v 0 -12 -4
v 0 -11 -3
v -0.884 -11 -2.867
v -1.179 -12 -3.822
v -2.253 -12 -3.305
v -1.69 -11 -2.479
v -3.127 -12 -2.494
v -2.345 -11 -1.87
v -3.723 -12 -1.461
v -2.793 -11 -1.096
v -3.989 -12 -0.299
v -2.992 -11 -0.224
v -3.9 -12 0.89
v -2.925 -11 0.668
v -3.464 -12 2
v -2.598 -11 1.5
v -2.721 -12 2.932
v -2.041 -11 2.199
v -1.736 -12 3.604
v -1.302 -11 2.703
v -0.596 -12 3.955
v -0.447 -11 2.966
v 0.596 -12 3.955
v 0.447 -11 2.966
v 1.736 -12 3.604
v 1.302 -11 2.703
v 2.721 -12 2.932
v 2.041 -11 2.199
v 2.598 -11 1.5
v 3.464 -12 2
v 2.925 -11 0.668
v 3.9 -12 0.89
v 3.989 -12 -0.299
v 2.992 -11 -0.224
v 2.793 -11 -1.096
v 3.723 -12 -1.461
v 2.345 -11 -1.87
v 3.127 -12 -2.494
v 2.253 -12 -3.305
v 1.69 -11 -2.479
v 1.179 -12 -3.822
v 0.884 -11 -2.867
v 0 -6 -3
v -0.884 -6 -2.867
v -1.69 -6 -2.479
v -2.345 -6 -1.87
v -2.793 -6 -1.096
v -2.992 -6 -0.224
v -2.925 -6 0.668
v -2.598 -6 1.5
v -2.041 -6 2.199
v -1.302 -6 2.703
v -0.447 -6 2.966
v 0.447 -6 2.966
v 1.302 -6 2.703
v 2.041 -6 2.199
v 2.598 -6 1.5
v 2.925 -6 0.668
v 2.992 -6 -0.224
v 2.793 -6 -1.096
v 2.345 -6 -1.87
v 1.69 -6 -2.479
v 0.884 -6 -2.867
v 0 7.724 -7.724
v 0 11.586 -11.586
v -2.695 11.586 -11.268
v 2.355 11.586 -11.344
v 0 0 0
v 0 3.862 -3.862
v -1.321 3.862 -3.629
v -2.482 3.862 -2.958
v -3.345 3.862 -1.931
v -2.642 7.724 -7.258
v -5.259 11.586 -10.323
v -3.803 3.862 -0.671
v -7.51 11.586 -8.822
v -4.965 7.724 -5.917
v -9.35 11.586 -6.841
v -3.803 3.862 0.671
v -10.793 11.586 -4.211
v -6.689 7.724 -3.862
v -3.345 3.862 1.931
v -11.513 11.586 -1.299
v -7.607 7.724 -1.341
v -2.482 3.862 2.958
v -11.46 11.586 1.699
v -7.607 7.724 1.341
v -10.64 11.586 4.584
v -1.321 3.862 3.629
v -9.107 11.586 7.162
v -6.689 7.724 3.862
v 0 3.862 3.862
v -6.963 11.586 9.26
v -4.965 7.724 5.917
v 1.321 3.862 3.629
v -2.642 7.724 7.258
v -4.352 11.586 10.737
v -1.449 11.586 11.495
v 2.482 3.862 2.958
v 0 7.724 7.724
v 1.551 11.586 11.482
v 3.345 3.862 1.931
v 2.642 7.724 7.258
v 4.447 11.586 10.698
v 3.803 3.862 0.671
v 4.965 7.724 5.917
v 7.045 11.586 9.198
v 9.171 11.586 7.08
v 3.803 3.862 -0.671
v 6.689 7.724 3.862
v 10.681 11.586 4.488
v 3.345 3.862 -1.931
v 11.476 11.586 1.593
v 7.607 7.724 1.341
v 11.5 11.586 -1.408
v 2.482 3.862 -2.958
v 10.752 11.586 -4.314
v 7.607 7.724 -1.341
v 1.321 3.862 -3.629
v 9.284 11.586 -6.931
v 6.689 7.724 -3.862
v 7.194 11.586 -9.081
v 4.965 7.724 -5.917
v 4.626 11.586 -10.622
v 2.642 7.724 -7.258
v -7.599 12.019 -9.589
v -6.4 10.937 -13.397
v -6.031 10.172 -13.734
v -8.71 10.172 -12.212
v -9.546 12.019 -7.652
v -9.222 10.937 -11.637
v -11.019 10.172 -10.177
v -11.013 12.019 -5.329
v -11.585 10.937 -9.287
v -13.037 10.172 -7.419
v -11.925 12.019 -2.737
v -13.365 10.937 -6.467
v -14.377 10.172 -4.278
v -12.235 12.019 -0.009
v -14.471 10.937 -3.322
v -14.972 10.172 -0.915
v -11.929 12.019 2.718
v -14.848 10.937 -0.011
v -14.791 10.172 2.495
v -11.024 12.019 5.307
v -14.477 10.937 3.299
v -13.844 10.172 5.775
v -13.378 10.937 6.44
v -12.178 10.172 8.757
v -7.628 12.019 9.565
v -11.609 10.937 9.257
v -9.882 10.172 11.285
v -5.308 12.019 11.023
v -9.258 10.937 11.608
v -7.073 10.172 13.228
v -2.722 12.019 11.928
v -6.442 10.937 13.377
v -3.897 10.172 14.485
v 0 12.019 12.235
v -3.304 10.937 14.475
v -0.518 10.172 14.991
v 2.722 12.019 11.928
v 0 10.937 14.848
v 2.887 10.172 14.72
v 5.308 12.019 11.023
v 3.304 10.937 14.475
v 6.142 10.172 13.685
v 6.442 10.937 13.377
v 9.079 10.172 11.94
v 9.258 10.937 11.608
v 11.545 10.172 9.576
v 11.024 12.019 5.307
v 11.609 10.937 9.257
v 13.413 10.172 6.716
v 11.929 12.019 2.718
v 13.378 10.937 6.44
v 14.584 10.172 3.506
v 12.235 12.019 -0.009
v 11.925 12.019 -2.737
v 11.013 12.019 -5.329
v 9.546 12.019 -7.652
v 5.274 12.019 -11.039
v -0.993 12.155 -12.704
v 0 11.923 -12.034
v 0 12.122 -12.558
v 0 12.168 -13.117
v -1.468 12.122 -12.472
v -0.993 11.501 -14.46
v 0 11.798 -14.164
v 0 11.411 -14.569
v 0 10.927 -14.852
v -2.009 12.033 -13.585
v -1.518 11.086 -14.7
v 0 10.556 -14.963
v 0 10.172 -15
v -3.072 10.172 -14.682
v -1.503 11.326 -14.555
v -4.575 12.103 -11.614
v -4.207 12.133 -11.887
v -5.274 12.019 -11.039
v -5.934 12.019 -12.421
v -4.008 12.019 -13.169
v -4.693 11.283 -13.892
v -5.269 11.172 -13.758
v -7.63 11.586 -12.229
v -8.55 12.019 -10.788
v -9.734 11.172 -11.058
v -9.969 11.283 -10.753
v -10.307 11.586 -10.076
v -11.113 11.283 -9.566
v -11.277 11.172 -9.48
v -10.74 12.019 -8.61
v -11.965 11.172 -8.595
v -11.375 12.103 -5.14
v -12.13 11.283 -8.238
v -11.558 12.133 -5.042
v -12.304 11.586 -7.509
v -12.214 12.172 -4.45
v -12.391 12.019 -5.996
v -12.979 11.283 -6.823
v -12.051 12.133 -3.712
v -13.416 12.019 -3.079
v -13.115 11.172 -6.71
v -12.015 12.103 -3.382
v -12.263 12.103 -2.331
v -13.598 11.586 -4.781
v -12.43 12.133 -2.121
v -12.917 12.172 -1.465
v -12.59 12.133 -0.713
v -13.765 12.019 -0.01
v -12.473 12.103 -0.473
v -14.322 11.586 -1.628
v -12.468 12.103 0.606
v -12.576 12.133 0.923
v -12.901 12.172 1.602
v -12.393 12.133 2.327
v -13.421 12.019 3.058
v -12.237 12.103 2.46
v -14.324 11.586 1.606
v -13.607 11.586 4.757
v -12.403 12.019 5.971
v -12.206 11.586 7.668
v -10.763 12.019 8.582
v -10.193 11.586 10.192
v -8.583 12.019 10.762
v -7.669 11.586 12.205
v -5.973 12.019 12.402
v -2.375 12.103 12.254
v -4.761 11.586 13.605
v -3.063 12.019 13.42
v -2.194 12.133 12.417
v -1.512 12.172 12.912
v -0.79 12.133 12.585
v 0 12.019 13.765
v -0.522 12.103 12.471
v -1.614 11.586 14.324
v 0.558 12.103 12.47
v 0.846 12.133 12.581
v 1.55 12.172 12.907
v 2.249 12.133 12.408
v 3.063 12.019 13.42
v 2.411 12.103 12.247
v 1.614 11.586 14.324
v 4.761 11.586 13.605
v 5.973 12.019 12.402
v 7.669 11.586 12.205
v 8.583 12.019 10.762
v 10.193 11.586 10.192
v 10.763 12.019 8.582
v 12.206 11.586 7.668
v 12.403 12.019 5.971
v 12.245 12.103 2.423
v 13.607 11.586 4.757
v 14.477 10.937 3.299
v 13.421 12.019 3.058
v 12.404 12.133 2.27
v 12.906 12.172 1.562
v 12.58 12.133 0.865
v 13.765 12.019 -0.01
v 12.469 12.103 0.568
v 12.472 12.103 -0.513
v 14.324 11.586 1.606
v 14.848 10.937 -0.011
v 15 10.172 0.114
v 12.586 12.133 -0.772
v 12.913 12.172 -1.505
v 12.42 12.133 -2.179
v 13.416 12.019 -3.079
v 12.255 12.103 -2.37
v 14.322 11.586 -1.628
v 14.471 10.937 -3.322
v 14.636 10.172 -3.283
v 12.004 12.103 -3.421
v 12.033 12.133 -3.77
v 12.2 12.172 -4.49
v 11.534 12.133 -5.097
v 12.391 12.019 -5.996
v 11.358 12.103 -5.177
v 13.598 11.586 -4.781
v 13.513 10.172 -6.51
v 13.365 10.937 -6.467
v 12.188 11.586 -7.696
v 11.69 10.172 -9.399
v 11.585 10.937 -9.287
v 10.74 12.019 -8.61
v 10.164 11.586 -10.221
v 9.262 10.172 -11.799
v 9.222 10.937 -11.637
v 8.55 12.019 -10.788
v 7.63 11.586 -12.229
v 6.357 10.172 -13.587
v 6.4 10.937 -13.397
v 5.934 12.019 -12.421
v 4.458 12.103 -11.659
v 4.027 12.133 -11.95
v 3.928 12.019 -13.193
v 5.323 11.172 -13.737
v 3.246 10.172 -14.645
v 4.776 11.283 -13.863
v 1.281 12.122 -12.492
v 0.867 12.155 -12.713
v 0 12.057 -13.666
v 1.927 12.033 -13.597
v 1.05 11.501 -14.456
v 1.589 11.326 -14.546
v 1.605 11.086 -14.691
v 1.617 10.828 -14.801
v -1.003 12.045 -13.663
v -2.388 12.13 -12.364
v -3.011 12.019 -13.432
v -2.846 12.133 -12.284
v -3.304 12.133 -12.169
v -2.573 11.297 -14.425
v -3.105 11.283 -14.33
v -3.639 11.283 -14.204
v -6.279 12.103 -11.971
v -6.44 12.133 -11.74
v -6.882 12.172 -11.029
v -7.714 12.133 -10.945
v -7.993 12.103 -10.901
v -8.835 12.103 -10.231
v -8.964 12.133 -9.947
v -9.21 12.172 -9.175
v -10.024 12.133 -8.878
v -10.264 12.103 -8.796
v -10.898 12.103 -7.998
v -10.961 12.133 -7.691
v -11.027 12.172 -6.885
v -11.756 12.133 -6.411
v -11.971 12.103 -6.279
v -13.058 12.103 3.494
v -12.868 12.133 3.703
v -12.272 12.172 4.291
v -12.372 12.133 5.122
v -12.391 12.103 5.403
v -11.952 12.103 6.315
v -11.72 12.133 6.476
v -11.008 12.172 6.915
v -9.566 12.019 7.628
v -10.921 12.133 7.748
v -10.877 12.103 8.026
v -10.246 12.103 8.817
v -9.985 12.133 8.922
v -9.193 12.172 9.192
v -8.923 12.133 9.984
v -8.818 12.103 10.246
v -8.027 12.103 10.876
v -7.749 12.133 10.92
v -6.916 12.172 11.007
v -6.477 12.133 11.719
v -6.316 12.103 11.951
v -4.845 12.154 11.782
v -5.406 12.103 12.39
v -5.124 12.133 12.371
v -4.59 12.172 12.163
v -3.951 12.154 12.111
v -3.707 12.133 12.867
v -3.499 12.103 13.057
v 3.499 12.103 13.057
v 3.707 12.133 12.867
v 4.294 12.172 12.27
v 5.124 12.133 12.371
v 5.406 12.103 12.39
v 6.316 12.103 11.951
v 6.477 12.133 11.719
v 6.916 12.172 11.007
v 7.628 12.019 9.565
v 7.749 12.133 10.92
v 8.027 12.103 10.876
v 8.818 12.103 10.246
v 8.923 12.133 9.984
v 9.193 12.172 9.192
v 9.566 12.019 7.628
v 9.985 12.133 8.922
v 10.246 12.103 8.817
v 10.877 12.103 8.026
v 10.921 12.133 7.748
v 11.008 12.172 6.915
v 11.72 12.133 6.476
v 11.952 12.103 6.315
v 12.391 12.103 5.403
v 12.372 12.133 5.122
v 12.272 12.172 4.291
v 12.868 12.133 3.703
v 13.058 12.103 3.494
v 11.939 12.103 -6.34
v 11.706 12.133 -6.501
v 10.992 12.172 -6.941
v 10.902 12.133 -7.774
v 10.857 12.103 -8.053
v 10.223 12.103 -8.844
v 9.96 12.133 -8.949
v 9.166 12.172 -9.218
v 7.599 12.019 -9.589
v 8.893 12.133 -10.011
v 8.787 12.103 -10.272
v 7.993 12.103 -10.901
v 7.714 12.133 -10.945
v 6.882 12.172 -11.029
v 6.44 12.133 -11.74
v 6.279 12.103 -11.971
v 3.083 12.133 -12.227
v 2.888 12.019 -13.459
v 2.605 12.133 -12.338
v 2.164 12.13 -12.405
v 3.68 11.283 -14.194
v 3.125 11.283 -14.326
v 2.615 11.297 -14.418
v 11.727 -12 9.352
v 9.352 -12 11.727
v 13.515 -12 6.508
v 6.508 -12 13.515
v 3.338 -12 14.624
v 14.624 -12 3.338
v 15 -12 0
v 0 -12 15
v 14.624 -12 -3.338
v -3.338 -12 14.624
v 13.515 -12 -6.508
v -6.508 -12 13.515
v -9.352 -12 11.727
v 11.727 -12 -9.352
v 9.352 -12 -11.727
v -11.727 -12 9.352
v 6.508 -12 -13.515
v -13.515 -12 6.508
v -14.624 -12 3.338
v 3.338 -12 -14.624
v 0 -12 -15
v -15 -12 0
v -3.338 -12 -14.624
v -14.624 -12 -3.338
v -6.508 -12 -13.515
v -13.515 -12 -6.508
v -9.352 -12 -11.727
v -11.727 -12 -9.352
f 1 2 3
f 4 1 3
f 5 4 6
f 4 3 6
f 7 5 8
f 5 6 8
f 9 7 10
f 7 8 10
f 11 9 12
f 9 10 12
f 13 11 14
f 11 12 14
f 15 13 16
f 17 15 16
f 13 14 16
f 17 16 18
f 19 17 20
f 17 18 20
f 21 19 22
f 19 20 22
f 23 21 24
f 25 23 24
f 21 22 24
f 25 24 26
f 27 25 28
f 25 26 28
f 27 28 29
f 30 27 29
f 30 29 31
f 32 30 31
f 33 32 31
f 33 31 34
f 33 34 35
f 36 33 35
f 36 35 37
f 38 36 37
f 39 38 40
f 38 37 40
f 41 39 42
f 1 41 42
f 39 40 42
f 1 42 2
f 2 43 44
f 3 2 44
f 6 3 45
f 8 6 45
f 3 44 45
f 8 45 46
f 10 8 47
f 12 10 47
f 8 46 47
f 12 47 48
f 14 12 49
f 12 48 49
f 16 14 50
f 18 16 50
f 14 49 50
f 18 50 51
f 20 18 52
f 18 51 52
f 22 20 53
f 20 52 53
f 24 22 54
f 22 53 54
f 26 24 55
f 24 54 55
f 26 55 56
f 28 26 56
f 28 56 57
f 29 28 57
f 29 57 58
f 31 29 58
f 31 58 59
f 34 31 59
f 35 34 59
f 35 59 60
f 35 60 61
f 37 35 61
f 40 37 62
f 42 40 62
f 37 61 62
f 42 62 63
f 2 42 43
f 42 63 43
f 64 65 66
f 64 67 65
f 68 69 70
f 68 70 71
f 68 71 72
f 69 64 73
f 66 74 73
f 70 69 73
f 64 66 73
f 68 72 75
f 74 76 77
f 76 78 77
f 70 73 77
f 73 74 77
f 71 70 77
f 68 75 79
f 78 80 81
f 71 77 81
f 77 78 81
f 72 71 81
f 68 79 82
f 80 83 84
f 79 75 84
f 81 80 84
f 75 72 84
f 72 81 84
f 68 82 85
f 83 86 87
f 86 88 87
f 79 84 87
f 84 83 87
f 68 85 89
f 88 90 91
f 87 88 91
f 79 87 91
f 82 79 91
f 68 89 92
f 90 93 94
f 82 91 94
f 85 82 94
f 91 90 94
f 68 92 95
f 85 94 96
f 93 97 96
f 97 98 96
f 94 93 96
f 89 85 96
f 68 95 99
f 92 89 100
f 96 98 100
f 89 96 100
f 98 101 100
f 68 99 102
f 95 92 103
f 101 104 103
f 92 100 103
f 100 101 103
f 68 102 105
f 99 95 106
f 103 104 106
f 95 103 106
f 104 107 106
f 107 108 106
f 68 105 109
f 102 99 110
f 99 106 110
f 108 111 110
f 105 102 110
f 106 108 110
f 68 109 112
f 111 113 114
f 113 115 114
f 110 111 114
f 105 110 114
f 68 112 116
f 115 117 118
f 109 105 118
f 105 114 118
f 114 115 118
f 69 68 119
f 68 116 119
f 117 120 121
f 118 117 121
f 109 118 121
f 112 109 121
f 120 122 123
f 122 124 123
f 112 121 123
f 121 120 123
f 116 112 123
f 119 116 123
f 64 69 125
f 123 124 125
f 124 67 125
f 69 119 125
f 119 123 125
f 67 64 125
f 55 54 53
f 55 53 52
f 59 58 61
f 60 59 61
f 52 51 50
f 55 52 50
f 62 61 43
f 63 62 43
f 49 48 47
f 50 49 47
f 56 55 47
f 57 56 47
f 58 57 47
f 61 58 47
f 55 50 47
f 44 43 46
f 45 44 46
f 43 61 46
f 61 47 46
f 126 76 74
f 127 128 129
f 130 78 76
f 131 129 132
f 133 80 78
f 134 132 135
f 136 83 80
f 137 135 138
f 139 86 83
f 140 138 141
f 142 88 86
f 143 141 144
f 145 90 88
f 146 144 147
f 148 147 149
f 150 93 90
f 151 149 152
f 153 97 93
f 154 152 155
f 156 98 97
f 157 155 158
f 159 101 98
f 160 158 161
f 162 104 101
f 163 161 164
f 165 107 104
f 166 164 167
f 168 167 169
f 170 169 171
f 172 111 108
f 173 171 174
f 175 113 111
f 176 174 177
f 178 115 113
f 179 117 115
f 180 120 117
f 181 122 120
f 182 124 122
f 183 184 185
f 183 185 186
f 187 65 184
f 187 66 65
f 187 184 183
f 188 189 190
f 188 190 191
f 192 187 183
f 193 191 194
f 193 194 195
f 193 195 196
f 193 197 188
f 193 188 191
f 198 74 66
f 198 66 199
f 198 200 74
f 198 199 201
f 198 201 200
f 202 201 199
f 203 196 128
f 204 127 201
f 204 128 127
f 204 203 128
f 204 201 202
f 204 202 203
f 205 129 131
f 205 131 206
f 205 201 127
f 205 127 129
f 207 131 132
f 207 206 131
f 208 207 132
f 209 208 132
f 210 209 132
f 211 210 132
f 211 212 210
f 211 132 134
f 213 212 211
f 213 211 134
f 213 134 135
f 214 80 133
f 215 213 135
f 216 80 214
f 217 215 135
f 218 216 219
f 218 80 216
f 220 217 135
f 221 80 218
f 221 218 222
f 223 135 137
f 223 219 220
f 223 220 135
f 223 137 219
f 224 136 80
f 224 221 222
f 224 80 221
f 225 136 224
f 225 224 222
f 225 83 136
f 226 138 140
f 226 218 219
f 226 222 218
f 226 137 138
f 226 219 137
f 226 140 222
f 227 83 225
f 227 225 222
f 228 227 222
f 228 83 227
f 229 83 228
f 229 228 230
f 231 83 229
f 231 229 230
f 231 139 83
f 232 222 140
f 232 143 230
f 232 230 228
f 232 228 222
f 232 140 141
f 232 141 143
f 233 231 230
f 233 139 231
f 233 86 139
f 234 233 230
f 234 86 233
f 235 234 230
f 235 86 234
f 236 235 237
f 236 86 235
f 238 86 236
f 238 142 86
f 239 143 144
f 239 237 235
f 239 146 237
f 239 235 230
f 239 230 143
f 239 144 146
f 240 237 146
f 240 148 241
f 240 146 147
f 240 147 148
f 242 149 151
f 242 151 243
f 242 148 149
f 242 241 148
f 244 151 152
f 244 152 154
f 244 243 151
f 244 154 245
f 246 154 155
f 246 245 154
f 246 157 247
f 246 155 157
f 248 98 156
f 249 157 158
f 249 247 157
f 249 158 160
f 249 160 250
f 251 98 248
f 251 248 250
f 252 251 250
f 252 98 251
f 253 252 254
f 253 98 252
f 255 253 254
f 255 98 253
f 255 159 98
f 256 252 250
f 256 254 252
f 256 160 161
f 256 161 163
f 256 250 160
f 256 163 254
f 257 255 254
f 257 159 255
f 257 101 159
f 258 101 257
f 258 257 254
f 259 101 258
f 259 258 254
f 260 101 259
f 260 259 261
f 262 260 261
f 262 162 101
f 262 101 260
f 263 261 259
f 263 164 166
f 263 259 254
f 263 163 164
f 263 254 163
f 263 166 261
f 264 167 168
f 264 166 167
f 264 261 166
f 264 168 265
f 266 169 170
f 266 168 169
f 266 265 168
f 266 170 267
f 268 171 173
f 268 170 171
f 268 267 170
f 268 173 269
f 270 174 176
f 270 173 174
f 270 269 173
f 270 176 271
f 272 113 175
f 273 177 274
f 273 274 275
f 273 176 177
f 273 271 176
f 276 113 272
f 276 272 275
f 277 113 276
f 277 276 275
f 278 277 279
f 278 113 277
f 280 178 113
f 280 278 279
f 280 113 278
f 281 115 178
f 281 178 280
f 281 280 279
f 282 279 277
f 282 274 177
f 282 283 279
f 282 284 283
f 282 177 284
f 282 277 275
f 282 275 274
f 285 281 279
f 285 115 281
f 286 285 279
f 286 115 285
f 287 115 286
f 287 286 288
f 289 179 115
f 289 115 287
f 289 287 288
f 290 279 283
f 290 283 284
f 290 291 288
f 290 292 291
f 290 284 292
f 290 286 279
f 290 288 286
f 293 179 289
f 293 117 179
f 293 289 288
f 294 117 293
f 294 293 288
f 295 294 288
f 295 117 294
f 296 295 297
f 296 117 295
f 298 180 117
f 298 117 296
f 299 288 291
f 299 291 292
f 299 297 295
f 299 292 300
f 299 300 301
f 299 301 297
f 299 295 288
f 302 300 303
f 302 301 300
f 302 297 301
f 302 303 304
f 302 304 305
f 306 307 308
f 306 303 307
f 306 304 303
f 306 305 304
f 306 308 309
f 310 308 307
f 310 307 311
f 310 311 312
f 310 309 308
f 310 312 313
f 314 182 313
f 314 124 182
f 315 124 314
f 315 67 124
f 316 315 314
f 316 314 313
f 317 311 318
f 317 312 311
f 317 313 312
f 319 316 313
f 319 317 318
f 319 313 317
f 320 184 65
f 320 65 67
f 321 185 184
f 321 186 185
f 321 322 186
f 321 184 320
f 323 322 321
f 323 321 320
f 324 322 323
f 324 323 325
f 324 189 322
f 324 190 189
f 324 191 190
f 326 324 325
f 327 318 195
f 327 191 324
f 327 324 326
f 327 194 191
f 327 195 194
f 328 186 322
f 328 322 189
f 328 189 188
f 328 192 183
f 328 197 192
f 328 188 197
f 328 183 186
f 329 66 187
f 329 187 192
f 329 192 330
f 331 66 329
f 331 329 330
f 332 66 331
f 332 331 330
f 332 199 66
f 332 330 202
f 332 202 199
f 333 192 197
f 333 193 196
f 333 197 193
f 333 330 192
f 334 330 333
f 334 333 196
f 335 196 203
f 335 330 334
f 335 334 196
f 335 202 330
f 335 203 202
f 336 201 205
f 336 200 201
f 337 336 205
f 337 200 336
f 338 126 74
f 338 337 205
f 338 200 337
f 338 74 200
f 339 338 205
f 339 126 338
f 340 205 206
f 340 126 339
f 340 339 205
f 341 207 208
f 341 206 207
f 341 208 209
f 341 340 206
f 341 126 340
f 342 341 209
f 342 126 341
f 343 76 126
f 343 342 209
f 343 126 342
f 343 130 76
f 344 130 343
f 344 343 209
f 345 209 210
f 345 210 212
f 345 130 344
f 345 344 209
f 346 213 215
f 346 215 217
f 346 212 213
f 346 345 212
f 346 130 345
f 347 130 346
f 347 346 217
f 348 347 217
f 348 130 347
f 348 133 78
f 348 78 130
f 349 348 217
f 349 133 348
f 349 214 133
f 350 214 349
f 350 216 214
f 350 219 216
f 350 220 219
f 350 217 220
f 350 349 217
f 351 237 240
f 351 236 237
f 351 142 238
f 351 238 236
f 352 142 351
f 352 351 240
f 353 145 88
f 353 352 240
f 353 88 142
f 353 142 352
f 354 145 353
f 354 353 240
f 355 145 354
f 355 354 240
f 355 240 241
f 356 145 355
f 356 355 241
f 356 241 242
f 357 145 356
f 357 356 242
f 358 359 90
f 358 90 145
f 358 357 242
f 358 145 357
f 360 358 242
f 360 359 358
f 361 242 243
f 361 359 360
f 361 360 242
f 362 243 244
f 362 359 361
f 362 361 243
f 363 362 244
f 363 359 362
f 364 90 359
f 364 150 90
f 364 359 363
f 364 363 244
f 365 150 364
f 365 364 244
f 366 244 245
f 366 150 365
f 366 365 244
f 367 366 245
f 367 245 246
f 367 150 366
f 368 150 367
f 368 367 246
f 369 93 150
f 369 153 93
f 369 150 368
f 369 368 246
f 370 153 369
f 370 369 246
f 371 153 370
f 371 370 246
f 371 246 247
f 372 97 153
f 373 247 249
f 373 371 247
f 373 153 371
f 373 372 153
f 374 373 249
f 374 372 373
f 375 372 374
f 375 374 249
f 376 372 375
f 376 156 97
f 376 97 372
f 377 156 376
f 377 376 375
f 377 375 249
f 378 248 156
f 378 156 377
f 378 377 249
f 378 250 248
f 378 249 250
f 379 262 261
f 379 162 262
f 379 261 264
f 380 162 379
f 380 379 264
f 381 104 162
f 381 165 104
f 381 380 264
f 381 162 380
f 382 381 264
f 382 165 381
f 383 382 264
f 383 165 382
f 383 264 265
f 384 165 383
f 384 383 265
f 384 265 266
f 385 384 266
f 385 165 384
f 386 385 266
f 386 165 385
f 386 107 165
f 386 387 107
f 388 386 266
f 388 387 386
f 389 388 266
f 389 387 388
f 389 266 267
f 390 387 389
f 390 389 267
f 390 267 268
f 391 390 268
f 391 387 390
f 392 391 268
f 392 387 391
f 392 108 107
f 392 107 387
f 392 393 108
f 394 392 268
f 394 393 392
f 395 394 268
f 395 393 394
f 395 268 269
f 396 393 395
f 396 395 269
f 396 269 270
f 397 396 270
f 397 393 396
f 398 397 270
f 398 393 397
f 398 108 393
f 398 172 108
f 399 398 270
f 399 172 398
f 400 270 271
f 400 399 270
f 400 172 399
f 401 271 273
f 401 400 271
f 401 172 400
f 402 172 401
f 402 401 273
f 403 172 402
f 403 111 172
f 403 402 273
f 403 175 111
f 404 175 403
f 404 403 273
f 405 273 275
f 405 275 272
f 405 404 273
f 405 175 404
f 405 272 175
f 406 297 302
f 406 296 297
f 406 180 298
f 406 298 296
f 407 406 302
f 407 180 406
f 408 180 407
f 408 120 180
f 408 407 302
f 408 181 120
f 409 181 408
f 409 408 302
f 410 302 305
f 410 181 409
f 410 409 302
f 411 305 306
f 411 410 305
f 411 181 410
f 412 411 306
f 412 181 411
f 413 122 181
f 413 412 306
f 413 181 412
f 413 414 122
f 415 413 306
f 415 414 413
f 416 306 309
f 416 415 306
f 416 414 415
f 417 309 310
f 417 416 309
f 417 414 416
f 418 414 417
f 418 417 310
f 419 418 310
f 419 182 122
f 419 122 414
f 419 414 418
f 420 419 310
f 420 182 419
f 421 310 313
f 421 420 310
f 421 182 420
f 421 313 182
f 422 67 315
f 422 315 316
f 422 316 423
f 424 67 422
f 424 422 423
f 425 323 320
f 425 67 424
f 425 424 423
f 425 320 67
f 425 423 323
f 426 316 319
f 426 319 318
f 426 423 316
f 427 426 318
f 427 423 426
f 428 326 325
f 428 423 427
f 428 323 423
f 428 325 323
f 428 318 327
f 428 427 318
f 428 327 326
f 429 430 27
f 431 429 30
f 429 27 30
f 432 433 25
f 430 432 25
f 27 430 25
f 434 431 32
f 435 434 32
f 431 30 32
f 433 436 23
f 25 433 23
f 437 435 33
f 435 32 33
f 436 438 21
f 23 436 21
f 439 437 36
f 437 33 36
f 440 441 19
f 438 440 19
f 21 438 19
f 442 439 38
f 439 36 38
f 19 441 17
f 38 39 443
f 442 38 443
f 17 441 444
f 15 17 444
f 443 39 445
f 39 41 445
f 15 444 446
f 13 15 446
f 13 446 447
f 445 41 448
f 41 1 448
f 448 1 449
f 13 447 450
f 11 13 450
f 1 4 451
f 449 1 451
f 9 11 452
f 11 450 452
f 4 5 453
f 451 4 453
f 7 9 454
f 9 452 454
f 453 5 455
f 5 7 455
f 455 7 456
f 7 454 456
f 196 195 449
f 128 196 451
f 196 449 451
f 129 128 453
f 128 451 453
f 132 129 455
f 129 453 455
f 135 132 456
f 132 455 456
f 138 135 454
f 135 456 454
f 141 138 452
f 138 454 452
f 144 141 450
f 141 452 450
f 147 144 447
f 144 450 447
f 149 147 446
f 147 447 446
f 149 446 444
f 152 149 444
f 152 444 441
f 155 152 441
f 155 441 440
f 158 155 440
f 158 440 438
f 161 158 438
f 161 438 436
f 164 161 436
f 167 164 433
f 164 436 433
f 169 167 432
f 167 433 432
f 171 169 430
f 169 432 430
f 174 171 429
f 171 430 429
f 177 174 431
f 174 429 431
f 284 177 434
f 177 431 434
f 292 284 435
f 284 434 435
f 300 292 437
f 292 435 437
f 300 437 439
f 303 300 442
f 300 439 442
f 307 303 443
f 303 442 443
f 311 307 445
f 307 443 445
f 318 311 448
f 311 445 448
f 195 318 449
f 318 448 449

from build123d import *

# Parameters (mm, degrees)
FILLET1_R     = 2
CHAMFER1_SIZE = 1


with BuildPart() as part:
    # Sketch1 → Revolve1 (revolve)
    with BuildSketch(Plane(origin=(0, 0, 0), x_dir=(0, 0, -1), z_dir=(1, 0, 0))):
        Polygon((0, 0), (15, 15), (15, -12), (3, -12), (3, -6), (0, -6), align=None)
    revolve(axis=Axis((0, -6, 0), (0, 1, 0)))

    # Fillet1
    fillet1_edges = [part.edges().sort_by_distance(p)[0] for p in [
        (0, 15, 15),
    ]]
    fillet(fillet1_edges, radius=FILLET1_R)

    # Chamfer1
    chamfer1_edges = [part.edges().sort_by_distance(p)[0] for p in [
        (0, -12, 3),
    ]]
    chamfer(chamfer1_edges, length=CHAMFER1_SIZE)


solid = part.part
